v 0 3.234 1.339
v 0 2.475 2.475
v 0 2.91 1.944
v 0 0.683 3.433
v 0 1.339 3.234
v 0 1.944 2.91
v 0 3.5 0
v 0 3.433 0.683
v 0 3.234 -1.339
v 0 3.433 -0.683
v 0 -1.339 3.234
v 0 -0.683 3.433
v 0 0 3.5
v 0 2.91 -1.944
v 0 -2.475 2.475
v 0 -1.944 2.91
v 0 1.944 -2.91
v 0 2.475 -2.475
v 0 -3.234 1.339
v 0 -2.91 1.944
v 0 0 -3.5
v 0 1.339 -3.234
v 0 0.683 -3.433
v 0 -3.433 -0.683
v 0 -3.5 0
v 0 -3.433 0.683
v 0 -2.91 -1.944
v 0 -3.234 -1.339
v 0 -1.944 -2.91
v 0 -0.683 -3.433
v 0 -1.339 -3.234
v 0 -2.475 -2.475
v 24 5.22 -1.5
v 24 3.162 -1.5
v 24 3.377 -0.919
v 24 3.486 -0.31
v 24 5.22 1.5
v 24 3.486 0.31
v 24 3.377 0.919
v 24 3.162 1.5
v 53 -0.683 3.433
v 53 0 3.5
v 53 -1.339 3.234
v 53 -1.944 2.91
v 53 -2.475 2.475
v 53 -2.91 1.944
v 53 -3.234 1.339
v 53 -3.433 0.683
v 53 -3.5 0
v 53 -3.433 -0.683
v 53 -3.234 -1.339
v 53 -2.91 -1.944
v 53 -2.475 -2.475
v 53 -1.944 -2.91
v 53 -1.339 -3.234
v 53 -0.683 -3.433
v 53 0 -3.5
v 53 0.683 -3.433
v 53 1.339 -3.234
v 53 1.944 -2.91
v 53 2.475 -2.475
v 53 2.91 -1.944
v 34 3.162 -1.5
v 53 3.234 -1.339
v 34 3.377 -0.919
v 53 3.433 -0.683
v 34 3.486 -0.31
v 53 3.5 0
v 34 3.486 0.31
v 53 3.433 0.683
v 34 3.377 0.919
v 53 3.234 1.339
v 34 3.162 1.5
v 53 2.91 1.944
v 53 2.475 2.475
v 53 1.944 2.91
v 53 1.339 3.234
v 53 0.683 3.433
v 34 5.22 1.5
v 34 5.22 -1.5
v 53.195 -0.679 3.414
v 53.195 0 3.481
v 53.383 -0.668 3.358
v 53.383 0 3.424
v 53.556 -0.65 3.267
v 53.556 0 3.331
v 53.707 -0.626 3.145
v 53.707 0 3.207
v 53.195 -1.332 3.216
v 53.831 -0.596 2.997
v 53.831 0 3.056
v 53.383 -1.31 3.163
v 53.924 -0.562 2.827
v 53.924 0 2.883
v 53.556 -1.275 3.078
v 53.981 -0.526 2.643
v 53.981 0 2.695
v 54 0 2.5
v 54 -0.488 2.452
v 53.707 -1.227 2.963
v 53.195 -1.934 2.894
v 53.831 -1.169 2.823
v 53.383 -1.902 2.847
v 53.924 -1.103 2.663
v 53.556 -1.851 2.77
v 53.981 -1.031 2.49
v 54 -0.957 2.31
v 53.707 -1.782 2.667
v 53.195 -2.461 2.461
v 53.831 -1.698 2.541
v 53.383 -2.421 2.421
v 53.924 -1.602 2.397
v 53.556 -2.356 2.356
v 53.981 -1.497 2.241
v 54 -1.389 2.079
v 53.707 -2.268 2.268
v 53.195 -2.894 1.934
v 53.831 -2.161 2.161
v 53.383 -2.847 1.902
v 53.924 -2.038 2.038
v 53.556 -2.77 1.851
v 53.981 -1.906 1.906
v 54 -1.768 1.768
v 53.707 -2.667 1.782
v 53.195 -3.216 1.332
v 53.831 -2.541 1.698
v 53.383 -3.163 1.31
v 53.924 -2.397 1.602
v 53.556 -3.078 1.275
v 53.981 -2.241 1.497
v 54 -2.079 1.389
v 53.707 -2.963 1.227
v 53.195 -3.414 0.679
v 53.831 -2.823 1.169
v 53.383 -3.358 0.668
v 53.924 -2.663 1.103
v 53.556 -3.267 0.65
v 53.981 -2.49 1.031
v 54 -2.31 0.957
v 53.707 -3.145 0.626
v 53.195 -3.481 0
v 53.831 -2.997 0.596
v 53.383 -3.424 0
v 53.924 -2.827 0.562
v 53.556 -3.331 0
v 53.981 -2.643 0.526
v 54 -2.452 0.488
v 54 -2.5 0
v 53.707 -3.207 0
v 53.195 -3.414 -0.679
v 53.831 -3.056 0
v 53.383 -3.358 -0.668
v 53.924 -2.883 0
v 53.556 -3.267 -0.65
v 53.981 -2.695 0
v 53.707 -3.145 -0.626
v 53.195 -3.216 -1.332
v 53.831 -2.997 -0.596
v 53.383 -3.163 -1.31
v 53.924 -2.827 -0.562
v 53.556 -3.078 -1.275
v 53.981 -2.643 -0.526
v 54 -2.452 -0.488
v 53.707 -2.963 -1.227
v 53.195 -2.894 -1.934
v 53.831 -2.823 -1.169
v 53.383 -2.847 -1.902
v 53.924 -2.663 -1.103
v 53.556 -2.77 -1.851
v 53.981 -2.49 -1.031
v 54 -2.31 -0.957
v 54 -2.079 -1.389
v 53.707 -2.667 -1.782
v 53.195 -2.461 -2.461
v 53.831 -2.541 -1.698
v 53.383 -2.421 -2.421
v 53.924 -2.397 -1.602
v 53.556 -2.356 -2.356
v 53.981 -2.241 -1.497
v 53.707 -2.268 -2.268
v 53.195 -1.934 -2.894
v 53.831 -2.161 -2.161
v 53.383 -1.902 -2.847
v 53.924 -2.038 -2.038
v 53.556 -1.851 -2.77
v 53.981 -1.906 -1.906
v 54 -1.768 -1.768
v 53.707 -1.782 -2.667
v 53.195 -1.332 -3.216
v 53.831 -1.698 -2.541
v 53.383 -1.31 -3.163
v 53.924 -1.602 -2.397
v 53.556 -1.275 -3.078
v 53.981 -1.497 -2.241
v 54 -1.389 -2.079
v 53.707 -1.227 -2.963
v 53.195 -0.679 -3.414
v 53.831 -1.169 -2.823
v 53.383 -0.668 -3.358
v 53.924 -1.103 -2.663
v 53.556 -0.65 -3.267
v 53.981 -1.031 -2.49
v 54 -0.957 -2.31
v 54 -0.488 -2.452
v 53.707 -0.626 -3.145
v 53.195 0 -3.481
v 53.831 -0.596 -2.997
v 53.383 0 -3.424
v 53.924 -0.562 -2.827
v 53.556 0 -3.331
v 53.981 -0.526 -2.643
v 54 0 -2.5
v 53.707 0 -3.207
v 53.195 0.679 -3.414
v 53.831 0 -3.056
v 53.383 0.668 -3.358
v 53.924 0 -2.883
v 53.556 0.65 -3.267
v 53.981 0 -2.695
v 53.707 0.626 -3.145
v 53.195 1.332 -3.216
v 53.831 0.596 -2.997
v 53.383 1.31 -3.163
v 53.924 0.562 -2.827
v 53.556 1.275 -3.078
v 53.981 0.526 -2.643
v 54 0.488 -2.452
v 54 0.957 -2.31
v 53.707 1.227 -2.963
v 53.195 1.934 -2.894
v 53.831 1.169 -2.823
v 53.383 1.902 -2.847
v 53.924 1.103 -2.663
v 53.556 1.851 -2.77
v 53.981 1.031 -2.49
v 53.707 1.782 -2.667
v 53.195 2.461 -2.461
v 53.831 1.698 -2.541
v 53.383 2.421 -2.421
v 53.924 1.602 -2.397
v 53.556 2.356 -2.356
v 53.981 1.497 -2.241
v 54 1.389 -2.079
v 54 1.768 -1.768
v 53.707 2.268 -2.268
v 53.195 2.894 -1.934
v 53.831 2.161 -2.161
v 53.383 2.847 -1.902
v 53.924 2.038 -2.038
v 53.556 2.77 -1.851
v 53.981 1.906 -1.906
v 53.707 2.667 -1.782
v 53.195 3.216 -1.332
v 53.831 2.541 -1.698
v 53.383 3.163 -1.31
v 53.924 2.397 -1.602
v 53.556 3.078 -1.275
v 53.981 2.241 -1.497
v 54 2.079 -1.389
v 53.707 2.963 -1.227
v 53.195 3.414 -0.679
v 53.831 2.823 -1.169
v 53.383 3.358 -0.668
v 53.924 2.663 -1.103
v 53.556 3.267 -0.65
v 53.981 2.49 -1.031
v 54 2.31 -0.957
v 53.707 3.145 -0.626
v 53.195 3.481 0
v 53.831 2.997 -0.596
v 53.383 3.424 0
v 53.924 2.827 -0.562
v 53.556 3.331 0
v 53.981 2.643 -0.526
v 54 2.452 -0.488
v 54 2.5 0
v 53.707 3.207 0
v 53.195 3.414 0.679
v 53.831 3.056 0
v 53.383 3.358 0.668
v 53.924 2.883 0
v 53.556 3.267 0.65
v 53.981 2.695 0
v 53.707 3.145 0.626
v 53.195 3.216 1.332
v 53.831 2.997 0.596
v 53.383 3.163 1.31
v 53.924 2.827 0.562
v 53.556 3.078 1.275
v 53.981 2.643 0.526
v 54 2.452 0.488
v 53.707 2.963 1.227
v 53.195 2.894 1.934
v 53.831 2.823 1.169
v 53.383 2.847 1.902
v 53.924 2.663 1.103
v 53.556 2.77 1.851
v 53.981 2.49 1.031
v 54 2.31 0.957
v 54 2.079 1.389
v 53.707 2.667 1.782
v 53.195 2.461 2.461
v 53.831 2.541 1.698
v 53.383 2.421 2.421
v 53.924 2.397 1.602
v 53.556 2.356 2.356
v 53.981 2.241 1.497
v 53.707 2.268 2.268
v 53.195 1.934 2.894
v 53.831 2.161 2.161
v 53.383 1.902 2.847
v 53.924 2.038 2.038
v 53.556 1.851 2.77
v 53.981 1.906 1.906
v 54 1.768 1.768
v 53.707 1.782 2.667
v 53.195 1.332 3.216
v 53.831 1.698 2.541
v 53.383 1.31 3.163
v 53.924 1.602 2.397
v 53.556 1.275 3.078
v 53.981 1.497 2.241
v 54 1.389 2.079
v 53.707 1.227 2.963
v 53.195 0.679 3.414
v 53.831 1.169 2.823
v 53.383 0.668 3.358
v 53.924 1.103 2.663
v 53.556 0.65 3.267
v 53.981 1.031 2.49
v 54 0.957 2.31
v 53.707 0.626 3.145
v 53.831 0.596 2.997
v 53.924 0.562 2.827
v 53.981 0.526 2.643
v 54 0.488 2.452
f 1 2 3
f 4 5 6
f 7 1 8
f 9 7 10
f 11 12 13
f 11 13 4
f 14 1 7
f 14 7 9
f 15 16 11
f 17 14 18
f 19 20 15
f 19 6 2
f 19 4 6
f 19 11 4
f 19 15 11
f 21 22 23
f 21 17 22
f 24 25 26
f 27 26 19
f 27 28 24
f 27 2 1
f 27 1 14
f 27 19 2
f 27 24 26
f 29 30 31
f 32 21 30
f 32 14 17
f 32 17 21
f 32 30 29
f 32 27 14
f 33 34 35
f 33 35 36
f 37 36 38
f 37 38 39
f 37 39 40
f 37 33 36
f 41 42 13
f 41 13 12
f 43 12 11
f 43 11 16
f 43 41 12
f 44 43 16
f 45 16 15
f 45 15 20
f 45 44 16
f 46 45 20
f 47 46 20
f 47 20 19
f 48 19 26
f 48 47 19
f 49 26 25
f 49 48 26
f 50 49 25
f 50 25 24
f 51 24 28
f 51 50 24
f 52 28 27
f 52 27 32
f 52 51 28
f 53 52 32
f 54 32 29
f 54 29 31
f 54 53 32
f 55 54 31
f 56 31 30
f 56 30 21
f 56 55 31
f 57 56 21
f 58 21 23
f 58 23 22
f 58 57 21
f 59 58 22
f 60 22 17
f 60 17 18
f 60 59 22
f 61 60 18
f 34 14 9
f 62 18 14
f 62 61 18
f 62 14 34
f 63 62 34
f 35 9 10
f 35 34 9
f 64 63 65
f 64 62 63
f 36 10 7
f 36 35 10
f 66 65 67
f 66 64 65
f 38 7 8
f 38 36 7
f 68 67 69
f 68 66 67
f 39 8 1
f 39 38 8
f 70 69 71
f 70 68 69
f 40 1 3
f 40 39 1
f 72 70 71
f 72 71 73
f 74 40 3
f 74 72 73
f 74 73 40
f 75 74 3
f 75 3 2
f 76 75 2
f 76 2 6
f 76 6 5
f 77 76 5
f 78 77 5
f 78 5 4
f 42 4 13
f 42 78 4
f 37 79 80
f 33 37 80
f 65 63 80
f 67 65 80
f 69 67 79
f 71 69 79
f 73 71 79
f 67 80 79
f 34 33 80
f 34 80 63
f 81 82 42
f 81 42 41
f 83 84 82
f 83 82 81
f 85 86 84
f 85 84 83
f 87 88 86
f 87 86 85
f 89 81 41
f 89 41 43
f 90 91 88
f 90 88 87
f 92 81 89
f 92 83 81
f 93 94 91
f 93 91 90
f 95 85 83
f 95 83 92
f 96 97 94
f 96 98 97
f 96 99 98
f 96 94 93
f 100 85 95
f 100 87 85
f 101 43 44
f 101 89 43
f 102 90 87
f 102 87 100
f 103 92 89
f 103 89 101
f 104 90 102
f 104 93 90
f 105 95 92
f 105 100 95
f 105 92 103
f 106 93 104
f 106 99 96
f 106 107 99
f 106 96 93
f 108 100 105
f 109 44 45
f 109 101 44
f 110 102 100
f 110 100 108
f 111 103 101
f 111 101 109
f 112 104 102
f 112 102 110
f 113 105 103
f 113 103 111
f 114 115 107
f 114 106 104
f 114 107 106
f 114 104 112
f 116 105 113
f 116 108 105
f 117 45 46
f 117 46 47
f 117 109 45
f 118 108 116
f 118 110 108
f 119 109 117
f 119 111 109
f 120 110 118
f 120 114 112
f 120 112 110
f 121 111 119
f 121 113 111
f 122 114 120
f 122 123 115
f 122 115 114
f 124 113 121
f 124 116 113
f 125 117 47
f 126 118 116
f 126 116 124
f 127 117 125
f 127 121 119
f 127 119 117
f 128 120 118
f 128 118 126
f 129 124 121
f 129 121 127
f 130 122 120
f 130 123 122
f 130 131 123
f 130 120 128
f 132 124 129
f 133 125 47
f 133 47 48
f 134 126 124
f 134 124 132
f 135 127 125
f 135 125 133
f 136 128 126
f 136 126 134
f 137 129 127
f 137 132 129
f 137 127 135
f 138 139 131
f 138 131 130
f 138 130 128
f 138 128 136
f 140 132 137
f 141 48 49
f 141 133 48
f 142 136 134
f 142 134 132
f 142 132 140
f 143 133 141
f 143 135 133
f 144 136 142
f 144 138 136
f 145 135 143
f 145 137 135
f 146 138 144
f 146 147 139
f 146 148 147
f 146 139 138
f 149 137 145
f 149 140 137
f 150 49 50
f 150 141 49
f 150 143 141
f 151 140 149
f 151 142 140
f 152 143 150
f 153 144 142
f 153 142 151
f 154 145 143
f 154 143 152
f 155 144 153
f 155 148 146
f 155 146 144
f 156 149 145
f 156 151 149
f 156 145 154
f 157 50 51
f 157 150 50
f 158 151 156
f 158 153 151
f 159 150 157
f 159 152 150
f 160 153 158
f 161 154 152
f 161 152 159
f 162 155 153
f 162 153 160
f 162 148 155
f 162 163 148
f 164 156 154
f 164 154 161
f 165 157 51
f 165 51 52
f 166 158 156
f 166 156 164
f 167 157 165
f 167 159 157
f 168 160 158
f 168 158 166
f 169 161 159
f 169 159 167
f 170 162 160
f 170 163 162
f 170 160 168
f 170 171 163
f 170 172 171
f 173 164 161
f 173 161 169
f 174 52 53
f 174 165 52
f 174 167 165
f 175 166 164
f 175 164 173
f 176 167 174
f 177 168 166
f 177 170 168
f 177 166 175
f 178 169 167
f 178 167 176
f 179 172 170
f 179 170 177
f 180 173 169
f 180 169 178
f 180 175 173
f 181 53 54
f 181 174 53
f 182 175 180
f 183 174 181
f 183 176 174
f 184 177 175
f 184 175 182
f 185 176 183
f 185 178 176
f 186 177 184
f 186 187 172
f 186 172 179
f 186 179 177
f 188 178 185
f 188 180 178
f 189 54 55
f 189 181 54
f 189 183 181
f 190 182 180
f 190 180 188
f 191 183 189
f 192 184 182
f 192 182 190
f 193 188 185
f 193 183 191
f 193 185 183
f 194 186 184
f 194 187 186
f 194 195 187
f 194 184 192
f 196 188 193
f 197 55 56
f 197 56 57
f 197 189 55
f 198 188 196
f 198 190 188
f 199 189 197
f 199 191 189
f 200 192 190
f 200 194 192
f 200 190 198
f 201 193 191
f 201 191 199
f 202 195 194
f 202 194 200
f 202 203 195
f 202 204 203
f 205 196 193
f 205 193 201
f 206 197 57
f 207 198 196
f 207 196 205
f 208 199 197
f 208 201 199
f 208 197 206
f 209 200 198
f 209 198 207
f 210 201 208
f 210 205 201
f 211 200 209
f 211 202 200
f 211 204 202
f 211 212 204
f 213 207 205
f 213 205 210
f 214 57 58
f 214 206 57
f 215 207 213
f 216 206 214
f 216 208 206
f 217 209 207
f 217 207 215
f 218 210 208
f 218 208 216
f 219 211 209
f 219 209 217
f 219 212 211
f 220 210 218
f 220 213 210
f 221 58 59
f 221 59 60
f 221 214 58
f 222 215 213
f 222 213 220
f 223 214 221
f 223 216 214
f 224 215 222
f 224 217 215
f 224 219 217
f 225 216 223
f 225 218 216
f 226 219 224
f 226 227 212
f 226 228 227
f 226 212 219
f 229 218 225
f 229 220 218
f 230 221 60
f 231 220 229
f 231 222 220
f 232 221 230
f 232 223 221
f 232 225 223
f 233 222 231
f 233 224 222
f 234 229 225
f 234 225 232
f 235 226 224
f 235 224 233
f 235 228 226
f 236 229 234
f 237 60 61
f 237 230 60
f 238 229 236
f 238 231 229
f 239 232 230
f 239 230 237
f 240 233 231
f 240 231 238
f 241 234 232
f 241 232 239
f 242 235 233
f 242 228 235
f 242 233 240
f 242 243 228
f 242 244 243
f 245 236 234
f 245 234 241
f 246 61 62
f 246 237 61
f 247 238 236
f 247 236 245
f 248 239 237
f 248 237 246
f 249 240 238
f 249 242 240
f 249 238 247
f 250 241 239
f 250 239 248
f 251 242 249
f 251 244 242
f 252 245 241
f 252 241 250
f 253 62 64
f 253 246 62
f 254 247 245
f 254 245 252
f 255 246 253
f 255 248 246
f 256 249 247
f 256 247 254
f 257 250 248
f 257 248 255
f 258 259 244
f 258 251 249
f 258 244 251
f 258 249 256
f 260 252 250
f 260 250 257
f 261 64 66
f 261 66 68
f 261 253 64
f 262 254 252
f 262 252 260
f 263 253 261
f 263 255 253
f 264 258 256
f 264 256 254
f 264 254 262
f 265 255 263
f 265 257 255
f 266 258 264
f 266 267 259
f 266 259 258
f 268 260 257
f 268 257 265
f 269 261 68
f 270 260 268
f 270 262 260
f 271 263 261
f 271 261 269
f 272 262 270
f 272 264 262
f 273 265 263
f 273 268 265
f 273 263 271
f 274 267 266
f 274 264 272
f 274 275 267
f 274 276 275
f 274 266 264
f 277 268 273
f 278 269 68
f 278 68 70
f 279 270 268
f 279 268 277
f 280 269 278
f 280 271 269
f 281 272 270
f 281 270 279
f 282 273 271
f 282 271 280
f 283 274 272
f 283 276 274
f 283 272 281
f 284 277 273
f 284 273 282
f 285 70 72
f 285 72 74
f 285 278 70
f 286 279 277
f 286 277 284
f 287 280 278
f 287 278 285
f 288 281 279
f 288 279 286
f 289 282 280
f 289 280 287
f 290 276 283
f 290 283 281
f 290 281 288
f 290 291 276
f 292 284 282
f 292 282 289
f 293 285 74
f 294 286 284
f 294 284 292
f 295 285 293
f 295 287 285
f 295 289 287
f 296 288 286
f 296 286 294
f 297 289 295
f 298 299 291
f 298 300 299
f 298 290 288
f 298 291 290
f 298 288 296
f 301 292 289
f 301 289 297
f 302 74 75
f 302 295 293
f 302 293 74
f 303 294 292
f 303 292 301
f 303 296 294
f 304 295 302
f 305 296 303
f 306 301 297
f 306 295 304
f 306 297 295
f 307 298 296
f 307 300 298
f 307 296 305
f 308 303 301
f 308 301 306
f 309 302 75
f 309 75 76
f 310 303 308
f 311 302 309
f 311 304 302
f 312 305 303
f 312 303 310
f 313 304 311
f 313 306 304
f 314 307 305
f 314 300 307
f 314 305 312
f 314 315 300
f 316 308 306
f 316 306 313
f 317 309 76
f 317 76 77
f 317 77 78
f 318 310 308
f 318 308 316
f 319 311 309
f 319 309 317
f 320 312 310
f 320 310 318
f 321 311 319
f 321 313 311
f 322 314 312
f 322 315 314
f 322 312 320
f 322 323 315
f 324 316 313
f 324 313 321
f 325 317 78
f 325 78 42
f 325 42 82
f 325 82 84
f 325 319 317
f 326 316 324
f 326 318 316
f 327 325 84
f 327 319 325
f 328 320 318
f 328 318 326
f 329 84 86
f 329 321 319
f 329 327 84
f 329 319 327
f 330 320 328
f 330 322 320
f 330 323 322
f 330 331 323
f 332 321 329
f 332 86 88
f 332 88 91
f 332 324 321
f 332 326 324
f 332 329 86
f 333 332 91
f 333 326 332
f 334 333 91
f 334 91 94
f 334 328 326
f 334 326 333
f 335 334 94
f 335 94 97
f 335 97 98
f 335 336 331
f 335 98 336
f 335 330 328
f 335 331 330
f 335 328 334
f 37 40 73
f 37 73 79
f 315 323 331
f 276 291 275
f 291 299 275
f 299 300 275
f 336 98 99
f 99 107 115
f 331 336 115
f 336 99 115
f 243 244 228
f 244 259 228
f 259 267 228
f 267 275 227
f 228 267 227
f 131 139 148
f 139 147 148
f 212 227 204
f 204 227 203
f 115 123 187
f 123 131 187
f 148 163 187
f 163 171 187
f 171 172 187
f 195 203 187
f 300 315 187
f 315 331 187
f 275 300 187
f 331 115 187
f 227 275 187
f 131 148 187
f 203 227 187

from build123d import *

# Parameters (mm, degrees)
IZIM1_W                     = 54
IZIM1_H                     = 3.5
Y_KSEKLIK_EKSTR_ZYON1_START = -30
Y_KSEKLIK_EKSTR_ZYON1_DEPTH = 10
RADYUS1_R                   = 1


with BuildPart() as part:
    # Çizim1 → Döndür1 (revolve)
    with BuildSketch(Plane.XY, mode=Mode.PRIVATE) as d_nd_r1_sk:
        with Locations((27, 1.75)):
            Rectangle(IZIM1_W, IZIM1_H)
    revolve(d_nd_r1_sk.sketch.rotate(Axis((0, 0, 0), (1, 0, 0)), 90), axis=Axis((0, 0, 0), (1, 0, 0)))

    # Çizim2 → Yükseklik-Ekstrüzyon1 (add)
    with BuildSketch(Plane(origin=(54, 0, 0), x_dir=(0, 0, -1), z_dir=(1, 0, 0)).offset(Y_KSEKLIK_EKSTR_ZYON1_START)):
        with BuildLine():
            Line((-1.5, 5.22), (1.5, 5.22))
            Line((1.5, 5.22), (1.5, 3.16227766))
            ThreePointArc((1.5, 3.16227766), (0, 3.5), (-1.5, 3.16227766))
            Line((-1.5, 3.16227766), (-1.5, 5.22))
        make_face()
    extrude(amount=Y_KSEKLIK_EKSTR_ZYON1_DEPTH)

    # Radyus1
    radyus1_edges = [part.edges().sort_by_distance(p)[0] for p in [
        (54, 0, -3.5),
    ]]
    fillet(radyus1_edges, radius=RADYUS1_R)


solid = part.part
